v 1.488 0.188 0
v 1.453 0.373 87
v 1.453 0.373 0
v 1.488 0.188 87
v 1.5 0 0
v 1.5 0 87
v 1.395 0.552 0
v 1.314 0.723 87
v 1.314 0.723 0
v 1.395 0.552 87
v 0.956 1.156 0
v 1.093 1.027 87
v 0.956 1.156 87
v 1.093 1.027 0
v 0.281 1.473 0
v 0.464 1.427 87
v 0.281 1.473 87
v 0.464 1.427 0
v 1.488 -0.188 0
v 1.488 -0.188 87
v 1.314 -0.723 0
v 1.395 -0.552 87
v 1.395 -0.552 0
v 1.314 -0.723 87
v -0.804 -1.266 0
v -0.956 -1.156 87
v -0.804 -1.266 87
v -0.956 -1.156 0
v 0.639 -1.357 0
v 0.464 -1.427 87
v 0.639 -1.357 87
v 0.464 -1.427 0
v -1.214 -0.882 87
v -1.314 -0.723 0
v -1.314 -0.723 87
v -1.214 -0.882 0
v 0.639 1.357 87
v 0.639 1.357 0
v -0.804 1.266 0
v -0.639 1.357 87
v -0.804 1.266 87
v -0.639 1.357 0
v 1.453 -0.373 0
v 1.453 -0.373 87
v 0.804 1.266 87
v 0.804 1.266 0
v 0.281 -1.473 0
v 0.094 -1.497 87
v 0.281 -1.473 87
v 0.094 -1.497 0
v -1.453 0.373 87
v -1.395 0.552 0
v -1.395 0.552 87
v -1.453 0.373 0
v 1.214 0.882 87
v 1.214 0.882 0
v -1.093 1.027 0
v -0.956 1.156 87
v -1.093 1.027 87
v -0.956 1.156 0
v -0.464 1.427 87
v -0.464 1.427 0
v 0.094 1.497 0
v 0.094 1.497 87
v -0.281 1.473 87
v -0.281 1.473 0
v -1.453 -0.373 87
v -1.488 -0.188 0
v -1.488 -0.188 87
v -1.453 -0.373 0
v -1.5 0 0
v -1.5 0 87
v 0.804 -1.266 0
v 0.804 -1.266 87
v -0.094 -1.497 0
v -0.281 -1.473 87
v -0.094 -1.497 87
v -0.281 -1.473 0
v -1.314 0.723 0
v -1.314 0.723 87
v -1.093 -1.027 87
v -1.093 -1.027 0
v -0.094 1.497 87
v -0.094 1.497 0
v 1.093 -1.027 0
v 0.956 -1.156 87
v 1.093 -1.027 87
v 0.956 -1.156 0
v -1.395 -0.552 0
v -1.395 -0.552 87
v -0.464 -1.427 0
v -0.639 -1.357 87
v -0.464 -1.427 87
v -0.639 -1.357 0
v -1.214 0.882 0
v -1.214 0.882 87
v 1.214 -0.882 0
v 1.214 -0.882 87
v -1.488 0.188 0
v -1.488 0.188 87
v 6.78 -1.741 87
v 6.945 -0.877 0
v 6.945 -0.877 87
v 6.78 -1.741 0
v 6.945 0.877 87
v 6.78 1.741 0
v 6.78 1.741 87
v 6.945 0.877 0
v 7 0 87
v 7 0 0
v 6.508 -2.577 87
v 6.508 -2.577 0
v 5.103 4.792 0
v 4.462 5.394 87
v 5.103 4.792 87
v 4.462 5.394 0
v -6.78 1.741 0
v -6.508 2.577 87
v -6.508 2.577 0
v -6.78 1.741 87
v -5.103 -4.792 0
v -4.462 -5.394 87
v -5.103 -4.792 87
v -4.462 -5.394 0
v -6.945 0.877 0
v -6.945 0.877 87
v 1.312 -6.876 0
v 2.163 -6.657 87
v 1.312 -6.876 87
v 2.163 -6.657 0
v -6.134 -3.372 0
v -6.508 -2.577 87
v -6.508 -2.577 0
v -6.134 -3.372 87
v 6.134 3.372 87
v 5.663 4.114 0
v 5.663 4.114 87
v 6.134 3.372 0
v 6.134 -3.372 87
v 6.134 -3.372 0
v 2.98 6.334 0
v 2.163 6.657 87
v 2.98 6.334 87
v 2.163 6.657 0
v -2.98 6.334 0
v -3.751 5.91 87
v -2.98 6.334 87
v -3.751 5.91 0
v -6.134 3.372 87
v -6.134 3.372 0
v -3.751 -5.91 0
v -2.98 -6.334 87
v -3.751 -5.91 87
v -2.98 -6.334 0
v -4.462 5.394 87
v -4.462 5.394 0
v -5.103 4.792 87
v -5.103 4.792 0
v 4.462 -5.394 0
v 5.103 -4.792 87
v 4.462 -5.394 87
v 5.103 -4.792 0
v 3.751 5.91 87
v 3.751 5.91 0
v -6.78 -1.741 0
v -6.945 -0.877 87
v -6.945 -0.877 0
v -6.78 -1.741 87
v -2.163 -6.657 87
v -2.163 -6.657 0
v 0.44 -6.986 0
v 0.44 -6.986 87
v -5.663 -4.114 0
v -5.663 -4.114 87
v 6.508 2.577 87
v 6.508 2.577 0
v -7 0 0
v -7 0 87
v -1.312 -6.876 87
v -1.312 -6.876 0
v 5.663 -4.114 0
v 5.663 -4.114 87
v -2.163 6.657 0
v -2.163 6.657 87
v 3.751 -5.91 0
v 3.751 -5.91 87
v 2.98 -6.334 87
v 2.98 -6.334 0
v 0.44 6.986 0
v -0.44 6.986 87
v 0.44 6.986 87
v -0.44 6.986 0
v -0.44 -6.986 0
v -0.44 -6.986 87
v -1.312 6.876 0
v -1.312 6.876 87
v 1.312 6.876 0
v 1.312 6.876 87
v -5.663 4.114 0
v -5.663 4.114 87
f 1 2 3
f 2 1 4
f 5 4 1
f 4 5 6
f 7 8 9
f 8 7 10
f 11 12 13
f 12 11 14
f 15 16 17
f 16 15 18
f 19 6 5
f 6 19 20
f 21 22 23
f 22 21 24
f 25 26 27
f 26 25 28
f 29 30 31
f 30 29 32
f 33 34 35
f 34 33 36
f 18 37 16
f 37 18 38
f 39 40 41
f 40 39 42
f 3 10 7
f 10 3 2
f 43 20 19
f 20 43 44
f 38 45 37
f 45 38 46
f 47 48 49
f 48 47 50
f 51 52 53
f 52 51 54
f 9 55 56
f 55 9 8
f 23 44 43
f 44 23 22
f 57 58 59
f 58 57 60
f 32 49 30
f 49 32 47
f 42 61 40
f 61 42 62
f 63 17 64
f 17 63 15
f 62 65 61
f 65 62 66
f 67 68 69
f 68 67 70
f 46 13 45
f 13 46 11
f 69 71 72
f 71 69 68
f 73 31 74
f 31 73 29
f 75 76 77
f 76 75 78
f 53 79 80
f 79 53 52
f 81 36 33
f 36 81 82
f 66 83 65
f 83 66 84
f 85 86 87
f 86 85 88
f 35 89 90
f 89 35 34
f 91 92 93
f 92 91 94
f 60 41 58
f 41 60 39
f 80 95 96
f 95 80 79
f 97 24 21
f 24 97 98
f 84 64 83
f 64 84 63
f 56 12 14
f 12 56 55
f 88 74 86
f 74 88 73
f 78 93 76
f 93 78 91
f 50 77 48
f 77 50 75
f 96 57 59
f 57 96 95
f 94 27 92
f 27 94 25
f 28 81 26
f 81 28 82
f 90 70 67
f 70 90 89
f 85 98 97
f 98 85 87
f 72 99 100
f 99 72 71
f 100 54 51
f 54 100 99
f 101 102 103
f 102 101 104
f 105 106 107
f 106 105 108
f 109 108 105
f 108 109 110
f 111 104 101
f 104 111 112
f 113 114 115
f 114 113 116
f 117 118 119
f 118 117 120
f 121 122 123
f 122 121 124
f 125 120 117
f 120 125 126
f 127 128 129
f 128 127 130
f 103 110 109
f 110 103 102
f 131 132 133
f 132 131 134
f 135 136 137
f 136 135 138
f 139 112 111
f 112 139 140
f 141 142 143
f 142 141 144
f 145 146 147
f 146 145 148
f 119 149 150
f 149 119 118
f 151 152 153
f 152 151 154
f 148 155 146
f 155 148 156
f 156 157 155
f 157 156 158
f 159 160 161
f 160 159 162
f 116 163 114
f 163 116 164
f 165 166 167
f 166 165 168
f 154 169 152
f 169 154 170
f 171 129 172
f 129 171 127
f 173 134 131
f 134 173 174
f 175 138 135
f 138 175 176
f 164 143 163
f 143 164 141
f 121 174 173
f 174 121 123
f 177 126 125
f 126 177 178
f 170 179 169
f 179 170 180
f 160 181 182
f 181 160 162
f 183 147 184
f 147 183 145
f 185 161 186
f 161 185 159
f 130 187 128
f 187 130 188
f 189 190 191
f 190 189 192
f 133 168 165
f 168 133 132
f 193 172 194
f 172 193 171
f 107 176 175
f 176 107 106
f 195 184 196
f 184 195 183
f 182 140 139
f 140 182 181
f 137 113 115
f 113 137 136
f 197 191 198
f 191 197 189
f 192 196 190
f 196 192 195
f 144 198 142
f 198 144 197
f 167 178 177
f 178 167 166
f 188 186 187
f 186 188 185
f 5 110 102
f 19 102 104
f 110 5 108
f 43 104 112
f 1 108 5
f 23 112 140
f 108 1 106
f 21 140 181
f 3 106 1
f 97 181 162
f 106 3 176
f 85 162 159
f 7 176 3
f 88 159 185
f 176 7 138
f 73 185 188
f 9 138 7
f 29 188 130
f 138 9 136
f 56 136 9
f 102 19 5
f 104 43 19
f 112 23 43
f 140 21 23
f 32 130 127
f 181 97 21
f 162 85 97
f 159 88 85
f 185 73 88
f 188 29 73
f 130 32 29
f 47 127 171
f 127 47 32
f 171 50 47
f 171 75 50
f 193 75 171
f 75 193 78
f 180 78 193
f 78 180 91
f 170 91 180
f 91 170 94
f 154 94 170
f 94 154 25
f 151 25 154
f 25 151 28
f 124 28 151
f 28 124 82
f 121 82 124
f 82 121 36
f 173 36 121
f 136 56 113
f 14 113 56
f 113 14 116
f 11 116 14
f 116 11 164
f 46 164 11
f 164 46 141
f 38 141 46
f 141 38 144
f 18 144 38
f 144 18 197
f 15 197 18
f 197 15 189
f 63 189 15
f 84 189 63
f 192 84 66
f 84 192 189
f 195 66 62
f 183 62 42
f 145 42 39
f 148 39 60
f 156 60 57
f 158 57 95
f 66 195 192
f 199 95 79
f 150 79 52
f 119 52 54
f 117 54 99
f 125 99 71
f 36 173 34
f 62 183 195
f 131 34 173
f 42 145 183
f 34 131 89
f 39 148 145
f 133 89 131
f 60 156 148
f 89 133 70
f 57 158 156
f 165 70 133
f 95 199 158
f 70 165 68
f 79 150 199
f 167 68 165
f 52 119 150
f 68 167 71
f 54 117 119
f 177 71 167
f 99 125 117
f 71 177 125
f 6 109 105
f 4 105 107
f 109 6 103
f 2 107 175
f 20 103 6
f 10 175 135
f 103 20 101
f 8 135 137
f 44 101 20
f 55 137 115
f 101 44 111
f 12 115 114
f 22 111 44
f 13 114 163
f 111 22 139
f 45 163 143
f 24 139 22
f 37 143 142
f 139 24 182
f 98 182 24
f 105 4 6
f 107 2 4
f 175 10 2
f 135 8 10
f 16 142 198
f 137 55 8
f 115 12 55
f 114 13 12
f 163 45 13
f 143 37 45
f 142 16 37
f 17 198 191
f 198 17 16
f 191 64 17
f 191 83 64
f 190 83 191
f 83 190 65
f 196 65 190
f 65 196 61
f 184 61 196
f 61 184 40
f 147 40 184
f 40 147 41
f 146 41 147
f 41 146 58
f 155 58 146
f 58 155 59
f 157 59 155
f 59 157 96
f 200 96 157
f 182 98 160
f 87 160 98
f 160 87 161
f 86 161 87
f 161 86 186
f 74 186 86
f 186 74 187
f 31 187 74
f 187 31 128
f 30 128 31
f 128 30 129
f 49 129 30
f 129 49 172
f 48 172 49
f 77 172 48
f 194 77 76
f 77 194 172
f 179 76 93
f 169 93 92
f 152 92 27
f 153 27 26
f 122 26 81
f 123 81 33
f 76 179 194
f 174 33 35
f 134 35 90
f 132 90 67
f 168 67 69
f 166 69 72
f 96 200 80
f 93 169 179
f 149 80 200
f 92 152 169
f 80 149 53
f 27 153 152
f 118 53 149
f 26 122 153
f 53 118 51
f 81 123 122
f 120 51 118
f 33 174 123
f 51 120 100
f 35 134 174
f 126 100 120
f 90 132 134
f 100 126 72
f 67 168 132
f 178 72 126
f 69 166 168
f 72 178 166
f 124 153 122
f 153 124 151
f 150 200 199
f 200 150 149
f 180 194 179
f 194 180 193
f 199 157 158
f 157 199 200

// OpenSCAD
$fn = 50;


difference() {
	union() {
		cylinder(h = 87, r = 7.0000000000);
	}
	union() {
		translate(v = [0, 0, -100]) {
			cylinder(h = 200, r = 1.5000000000);
		}
		translate(v = [0, 0, -100]) {
			cylinder(h = 200, r = 1.5000000000);
		}
	}
}
